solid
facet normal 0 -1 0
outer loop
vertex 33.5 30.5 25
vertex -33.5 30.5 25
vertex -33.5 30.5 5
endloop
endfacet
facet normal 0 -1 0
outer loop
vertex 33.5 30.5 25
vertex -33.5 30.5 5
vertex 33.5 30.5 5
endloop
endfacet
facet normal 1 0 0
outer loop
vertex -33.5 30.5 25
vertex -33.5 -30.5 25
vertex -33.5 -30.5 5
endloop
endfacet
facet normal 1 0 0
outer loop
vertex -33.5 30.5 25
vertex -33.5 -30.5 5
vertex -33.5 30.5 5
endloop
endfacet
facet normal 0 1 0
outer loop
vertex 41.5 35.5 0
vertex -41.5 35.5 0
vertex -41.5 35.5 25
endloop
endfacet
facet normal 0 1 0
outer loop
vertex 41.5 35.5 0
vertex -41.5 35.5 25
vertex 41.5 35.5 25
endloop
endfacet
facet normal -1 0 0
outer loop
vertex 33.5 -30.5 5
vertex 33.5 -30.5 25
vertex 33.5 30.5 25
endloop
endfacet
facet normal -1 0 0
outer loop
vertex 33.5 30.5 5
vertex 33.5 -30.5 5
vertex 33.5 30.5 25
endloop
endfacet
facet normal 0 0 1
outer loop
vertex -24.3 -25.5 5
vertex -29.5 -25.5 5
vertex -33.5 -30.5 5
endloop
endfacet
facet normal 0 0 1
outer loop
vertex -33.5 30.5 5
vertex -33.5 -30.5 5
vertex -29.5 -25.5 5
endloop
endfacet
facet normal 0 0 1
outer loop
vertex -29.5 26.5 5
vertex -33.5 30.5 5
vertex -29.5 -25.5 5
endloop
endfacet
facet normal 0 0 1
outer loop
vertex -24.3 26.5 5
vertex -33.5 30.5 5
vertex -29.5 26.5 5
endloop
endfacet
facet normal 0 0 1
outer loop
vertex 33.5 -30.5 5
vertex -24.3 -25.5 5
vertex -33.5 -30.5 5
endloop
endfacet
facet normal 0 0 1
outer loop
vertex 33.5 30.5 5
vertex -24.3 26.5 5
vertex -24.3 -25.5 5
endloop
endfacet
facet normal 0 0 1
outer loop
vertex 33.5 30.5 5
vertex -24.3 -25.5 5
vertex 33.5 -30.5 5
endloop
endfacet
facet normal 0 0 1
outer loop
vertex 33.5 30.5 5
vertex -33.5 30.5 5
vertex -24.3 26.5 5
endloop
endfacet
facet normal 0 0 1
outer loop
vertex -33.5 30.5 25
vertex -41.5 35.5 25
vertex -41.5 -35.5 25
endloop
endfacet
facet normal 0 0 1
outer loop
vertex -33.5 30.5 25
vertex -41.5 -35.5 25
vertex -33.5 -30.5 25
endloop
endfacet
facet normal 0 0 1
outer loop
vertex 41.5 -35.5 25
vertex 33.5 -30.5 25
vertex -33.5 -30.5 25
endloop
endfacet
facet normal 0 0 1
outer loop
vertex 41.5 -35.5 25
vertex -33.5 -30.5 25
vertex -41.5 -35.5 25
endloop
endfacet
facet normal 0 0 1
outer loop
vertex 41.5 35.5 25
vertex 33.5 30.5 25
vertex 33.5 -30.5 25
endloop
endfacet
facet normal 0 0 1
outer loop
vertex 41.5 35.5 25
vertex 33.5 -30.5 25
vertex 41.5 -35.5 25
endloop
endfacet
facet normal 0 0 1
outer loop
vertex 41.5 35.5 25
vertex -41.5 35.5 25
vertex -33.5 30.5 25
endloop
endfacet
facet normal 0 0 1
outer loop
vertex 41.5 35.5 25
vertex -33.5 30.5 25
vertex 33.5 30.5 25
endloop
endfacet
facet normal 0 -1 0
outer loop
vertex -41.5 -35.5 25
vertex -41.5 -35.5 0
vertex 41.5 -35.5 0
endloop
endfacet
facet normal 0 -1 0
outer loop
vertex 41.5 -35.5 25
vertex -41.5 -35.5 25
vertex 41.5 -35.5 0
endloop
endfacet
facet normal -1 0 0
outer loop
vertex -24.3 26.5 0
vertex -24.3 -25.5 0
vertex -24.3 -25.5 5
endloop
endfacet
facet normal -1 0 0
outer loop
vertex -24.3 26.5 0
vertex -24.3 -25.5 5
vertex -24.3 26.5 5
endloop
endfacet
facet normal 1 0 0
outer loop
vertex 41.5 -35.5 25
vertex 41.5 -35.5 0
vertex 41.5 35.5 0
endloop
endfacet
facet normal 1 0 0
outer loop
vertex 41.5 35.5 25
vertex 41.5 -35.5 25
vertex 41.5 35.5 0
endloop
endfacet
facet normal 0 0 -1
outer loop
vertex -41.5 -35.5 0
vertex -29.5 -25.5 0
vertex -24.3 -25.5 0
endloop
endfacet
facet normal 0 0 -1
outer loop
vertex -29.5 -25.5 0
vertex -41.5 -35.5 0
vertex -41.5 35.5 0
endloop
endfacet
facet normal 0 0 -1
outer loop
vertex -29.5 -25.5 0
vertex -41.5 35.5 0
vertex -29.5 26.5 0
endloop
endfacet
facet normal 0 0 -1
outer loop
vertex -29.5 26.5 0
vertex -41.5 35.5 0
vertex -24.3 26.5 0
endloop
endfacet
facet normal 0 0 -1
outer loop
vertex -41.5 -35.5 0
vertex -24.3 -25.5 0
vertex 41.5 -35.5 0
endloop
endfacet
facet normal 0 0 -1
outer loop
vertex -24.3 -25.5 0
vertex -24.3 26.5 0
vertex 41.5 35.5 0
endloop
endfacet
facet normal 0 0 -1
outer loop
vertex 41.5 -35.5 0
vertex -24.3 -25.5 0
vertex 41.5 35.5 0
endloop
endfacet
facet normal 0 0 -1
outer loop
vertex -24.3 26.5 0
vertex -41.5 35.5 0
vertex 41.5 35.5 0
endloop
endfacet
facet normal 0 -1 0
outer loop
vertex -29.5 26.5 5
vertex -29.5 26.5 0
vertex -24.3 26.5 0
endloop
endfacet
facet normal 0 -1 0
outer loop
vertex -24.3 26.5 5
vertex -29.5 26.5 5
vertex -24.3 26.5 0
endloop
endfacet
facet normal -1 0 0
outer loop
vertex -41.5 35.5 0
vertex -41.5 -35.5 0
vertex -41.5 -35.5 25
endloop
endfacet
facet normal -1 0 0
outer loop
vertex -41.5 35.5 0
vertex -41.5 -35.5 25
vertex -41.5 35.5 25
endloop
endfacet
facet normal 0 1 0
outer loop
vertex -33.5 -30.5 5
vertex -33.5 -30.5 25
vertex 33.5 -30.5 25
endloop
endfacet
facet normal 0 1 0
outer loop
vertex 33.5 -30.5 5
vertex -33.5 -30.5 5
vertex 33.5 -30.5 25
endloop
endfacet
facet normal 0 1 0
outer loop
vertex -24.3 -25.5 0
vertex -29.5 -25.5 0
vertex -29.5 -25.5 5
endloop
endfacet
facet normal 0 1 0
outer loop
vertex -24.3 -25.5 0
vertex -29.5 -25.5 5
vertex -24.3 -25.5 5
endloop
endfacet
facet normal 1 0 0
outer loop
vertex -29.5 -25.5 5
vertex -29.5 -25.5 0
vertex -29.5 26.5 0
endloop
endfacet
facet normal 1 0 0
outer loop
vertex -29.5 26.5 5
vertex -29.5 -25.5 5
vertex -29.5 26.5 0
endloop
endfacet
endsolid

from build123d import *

# Parameters (mm, degrees)
F0_W     = 83
F0_H     = 71
F1_DEPTH = 25
F2_W     = 67
F2_H     = 61
F3_DEPTH = 20
F4_W     = 5.2
F4_H     = 52
F5_DEPTH = 25.001


with BuildPart() as f1:
    # F0 (on Top) → F1 (new body)
    with BuildSketch(Plane.XY):
        Rectangle(F0_W, F0_H)
    extrude(amount=F1_DEPTH)

    # F2 (on face) → F3 (cut)
    with BuildSketch(Plane.XY.offset(25)):
        Rectangle(F2_W, F2_H)
    extrude(amount=-F3_DEPTH, mode=Mode.SUBTRACT)

    # F4 (on Top) → F5 (cut, through all)
    with BuildSketch(Plane.XY):
        with Locations((-26.9, 0.5)):
            Rectangle(F4_W, F4_H)
    extrude(amount=F5_DEPTH, mode=Mode.SUBTRACT)


solid = f1.part
